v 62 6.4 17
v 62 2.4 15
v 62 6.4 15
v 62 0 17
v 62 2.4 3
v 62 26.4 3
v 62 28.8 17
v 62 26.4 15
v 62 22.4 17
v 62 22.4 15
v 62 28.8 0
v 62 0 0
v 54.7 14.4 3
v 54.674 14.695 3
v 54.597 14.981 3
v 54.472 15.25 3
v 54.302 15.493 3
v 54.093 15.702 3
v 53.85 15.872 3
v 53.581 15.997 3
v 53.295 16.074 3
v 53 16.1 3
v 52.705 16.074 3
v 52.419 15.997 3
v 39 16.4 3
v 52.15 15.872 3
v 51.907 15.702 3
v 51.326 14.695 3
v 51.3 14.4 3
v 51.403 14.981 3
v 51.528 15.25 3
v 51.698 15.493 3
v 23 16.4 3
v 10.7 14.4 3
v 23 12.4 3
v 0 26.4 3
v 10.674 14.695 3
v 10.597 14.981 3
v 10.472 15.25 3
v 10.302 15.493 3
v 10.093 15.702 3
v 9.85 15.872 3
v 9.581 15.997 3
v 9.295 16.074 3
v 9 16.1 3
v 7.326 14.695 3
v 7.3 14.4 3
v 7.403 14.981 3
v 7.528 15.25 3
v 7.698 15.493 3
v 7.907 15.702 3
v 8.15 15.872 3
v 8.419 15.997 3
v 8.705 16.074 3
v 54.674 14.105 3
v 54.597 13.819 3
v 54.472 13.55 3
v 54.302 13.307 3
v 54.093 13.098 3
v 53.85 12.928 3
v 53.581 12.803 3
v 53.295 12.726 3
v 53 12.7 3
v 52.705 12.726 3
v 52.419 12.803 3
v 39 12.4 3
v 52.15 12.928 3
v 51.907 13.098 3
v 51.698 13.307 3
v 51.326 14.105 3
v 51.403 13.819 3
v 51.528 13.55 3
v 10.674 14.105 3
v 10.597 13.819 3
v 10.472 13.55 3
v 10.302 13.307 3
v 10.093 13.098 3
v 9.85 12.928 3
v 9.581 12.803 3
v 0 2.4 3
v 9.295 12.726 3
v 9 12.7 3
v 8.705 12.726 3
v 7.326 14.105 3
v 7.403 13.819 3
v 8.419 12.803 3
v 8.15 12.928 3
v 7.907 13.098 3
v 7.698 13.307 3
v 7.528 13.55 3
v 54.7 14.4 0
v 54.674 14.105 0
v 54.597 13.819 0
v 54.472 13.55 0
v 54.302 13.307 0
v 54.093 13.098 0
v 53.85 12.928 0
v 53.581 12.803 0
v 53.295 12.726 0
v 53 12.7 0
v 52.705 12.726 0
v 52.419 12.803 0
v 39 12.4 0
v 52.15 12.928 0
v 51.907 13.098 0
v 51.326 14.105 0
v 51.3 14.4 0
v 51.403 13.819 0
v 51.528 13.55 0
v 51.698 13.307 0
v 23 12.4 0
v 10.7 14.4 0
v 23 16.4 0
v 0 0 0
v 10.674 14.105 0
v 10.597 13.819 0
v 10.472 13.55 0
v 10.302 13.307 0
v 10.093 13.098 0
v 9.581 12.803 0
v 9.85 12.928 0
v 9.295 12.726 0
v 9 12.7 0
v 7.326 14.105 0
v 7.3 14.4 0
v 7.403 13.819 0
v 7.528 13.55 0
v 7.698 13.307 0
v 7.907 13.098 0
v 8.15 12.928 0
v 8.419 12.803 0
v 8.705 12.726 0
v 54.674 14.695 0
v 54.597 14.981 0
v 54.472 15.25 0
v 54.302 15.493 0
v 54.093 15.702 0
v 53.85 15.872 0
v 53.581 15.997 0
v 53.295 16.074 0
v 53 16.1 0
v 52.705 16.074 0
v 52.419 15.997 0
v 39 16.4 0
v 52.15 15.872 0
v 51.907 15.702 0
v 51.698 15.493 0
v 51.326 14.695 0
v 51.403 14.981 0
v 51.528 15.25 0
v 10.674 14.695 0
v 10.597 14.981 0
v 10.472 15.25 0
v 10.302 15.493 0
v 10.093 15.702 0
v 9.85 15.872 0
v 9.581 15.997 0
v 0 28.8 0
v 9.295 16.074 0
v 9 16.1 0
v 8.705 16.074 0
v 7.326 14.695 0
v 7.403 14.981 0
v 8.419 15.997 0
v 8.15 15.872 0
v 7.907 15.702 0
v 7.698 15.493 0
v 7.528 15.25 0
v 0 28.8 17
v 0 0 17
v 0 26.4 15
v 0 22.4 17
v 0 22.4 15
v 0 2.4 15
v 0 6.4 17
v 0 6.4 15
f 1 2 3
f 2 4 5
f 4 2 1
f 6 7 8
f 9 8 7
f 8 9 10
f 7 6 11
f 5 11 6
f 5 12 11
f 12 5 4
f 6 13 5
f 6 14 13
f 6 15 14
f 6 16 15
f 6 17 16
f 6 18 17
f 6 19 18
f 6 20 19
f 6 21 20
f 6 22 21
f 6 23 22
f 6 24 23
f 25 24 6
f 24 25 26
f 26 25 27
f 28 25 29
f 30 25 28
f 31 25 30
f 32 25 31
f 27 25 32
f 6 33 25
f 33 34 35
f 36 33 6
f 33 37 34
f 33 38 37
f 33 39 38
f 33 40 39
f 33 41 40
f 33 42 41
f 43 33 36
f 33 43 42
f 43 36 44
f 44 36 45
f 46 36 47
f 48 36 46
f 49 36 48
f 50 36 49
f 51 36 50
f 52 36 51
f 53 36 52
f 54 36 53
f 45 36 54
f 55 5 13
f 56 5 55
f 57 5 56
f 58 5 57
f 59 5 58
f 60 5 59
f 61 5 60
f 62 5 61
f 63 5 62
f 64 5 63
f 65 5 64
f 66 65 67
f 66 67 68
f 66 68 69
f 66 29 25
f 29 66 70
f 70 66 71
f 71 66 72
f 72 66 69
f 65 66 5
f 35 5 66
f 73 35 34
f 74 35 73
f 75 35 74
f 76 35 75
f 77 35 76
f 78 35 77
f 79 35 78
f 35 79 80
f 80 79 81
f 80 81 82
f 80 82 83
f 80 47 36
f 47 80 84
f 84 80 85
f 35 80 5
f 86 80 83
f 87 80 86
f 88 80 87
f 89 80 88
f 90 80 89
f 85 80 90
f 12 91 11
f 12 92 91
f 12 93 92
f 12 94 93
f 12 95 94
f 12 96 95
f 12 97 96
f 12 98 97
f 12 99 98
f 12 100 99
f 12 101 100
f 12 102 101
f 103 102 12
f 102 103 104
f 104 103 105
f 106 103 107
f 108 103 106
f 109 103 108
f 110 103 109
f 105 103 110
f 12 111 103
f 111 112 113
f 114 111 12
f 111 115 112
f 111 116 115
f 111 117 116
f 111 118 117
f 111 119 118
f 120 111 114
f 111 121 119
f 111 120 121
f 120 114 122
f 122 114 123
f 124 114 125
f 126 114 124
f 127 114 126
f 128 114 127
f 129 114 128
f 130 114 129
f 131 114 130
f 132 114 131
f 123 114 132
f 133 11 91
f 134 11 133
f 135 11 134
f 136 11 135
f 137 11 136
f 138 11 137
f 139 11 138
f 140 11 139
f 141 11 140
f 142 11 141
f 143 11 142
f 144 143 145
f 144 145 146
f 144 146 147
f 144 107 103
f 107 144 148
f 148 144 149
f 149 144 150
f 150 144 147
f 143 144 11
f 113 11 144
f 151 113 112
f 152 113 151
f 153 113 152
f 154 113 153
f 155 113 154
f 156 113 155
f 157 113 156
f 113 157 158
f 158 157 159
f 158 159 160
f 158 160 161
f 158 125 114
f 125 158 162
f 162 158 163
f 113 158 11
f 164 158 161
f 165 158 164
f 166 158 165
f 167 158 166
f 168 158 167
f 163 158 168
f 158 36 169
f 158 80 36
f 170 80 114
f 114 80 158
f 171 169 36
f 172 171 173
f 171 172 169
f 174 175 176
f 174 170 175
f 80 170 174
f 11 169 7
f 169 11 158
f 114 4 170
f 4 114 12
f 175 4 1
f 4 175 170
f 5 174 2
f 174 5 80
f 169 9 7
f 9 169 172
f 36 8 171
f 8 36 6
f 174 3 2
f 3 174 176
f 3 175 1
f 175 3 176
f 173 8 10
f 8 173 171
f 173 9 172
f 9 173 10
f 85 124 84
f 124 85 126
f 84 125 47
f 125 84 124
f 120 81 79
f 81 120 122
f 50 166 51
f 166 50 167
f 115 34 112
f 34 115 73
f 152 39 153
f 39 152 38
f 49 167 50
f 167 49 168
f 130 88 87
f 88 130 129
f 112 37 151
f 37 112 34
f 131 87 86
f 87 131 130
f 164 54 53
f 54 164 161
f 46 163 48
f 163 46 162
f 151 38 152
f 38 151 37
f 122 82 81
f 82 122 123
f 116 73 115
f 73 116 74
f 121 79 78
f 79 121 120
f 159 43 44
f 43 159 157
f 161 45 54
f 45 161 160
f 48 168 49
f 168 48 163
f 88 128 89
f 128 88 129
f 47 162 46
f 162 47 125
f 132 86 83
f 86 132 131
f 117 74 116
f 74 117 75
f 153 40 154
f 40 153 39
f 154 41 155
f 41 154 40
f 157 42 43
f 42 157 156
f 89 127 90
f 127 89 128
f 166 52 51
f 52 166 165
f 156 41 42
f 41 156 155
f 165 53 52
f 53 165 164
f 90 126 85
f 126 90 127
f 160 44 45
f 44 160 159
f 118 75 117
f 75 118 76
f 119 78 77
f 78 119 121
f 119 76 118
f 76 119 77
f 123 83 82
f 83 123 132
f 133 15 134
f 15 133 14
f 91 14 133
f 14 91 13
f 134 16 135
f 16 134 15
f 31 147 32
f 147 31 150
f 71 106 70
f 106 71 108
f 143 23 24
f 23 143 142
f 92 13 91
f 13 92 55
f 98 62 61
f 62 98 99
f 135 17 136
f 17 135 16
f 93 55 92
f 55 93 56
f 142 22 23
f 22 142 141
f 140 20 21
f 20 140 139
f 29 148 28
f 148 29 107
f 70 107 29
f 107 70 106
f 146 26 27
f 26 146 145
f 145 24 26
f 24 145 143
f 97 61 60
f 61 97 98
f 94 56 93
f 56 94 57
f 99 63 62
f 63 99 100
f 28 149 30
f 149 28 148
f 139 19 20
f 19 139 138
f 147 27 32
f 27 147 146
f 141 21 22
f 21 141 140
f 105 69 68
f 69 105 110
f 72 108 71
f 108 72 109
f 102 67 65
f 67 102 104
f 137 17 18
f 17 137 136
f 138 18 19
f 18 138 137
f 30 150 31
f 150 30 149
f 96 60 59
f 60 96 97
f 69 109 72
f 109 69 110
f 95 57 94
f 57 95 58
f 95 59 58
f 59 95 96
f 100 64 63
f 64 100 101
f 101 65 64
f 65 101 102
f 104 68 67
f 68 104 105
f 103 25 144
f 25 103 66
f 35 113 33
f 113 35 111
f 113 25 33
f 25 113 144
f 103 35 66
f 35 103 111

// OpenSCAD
// Generic USB adapter clip for Yaver Box Lite V0.
// Measure the adapter and adjust body_w/body_h. Screw to base_plate bosses.
// PART = "clip"

PART = "clip";
$fn = 36;

clip_l = 62;
body_w = 24;
body_h = 14;
wall = 2.4;
base_t = 3;
screw_spacing = 44;

module clip(){
  difference(){
    union(){
      cube([clip_l, body_w + 2*wall, base_t]);
      translate([0,0,base_t]) cube([clip_l, wall, body_h]);
      translate([0,body_w+wall,base_t]) cube([clip_l, wall, body_h]);
      // front lip
      translate([0,0,base_t+body_h-2]) cube([clip_l, wall+4, 2]);
      translate([0,body_w+wall-4,base_t+body_h-2]) cube([clip_l, wall+4, 2]);
    }
    for(x=[clip_l/2-screw_spacing/2, clip_l/2+screw_spacing/2])
      translate([x, body_w/2+wall, -1]) cylinder(d=3.4, h=base_t+2);
    // cable tie passthrough under adapter.
    translate([clip_l/2-8, body_w/2+wall-2, -1]) cube([16,4,base_t+2]);
  }
}

clip();
